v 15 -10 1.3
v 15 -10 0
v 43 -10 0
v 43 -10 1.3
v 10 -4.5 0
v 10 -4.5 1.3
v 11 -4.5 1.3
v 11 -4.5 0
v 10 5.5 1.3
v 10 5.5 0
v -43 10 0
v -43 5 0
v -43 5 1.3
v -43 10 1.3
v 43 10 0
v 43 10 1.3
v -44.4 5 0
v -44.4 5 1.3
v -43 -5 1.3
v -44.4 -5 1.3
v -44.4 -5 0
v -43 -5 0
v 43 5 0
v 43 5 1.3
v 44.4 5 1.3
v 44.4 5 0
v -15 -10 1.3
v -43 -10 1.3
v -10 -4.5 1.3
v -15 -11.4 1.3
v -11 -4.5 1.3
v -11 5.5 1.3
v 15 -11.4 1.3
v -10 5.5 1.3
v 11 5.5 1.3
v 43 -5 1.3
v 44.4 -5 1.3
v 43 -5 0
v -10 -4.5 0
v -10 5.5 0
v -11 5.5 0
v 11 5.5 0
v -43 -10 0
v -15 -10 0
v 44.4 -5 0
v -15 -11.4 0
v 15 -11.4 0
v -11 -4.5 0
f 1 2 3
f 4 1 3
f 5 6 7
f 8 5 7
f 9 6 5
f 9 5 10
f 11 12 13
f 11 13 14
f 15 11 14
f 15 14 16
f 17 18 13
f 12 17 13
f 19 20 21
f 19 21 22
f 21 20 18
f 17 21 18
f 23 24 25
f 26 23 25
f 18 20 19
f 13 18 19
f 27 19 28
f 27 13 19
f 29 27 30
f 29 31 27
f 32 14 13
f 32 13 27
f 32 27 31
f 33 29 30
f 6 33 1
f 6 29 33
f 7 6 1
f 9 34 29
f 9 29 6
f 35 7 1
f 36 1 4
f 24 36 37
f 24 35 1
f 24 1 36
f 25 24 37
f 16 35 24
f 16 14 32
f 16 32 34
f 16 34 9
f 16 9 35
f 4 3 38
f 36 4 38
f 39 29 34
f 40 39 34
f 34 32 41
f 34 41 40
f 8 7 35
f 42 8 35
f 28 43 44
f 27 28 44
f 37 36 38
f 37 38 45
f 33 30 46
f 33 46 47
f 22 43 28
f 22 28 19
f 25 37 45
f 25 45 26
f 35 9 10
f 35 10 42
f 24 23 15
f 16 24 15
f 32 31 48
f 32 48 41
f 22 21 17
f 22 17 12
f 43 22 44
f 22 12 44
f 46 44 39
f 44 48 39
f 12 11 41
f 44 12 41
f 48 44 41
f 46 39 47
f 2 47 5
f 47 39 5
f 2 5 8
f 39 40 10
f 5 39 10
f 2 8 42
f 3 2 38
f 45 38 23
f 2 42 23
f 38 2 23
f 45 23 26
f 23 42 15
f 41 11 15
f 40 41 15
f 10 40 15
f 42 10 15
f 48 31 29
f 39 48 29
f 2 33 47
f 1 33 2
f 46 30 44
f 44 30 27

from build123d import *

# Parameters (mm, degrees)
SKETCH1_W           = 86
SKETCH1_H           = 20
BOSS_EXTRUDE1_DEPTH = 1.3
SKETCH2_W           = 30
SKETCH2_H           = 1.4
SKETCH2_W_2         = 1.4
SKETCH2_H_2         = 10
BOSS_EXTRUDE2_DEPTH = 1.3
SKETCH3_W           = 1
SKETCH3_H           = 10
CUT_EXTRUDE1_DEPTH  = 46.858586982


with BuildPart() as part:
    # Sketch1 → Boss-Extrude1 (new body)
    with BuildSketch(Plane.XY):
        Rectangle(SKETCH1_W, SKETCH1_H)
    extrude(amount=BOSS_EXTRUDE1_DEPTH)

    # Sketch2 → Boss-Extrude2 (add)
    with BuildSketch(Plane.XY.offset(1.3)):
        with Locations((0, -10.7)):
            Rectangle(SKETCH2_W, SKETCH2_H)
        with Locations((-43.7, 0)):
            Rectangle(SKETCH2_W_2, SKETCH2_H_2)
        with Locations((43.7, 0)):
            Rectangle(SKETCH2_W_2, SKETCH2_H_2)
    extrude(amount=-BOSS_EXTRUDE2_DEPTH)

    # Sketch3 → Cut-Extrude1 (cut, through all)
    with BuildSketch(Plane.XY.offset(1.3)):
        with Locations((-10.5, 0.5)):
            Rectangle(SKETCH3_W, SKETCH3_H)
        with Locations((10.5, 0.5)):
            Rectangle(SKETCH3_W, SKETCH3_H)
    extrude(amount=-CUT_EXTRUDE1_DEPTH, mode=Mode.SUBTRACT)


solid = part.part
